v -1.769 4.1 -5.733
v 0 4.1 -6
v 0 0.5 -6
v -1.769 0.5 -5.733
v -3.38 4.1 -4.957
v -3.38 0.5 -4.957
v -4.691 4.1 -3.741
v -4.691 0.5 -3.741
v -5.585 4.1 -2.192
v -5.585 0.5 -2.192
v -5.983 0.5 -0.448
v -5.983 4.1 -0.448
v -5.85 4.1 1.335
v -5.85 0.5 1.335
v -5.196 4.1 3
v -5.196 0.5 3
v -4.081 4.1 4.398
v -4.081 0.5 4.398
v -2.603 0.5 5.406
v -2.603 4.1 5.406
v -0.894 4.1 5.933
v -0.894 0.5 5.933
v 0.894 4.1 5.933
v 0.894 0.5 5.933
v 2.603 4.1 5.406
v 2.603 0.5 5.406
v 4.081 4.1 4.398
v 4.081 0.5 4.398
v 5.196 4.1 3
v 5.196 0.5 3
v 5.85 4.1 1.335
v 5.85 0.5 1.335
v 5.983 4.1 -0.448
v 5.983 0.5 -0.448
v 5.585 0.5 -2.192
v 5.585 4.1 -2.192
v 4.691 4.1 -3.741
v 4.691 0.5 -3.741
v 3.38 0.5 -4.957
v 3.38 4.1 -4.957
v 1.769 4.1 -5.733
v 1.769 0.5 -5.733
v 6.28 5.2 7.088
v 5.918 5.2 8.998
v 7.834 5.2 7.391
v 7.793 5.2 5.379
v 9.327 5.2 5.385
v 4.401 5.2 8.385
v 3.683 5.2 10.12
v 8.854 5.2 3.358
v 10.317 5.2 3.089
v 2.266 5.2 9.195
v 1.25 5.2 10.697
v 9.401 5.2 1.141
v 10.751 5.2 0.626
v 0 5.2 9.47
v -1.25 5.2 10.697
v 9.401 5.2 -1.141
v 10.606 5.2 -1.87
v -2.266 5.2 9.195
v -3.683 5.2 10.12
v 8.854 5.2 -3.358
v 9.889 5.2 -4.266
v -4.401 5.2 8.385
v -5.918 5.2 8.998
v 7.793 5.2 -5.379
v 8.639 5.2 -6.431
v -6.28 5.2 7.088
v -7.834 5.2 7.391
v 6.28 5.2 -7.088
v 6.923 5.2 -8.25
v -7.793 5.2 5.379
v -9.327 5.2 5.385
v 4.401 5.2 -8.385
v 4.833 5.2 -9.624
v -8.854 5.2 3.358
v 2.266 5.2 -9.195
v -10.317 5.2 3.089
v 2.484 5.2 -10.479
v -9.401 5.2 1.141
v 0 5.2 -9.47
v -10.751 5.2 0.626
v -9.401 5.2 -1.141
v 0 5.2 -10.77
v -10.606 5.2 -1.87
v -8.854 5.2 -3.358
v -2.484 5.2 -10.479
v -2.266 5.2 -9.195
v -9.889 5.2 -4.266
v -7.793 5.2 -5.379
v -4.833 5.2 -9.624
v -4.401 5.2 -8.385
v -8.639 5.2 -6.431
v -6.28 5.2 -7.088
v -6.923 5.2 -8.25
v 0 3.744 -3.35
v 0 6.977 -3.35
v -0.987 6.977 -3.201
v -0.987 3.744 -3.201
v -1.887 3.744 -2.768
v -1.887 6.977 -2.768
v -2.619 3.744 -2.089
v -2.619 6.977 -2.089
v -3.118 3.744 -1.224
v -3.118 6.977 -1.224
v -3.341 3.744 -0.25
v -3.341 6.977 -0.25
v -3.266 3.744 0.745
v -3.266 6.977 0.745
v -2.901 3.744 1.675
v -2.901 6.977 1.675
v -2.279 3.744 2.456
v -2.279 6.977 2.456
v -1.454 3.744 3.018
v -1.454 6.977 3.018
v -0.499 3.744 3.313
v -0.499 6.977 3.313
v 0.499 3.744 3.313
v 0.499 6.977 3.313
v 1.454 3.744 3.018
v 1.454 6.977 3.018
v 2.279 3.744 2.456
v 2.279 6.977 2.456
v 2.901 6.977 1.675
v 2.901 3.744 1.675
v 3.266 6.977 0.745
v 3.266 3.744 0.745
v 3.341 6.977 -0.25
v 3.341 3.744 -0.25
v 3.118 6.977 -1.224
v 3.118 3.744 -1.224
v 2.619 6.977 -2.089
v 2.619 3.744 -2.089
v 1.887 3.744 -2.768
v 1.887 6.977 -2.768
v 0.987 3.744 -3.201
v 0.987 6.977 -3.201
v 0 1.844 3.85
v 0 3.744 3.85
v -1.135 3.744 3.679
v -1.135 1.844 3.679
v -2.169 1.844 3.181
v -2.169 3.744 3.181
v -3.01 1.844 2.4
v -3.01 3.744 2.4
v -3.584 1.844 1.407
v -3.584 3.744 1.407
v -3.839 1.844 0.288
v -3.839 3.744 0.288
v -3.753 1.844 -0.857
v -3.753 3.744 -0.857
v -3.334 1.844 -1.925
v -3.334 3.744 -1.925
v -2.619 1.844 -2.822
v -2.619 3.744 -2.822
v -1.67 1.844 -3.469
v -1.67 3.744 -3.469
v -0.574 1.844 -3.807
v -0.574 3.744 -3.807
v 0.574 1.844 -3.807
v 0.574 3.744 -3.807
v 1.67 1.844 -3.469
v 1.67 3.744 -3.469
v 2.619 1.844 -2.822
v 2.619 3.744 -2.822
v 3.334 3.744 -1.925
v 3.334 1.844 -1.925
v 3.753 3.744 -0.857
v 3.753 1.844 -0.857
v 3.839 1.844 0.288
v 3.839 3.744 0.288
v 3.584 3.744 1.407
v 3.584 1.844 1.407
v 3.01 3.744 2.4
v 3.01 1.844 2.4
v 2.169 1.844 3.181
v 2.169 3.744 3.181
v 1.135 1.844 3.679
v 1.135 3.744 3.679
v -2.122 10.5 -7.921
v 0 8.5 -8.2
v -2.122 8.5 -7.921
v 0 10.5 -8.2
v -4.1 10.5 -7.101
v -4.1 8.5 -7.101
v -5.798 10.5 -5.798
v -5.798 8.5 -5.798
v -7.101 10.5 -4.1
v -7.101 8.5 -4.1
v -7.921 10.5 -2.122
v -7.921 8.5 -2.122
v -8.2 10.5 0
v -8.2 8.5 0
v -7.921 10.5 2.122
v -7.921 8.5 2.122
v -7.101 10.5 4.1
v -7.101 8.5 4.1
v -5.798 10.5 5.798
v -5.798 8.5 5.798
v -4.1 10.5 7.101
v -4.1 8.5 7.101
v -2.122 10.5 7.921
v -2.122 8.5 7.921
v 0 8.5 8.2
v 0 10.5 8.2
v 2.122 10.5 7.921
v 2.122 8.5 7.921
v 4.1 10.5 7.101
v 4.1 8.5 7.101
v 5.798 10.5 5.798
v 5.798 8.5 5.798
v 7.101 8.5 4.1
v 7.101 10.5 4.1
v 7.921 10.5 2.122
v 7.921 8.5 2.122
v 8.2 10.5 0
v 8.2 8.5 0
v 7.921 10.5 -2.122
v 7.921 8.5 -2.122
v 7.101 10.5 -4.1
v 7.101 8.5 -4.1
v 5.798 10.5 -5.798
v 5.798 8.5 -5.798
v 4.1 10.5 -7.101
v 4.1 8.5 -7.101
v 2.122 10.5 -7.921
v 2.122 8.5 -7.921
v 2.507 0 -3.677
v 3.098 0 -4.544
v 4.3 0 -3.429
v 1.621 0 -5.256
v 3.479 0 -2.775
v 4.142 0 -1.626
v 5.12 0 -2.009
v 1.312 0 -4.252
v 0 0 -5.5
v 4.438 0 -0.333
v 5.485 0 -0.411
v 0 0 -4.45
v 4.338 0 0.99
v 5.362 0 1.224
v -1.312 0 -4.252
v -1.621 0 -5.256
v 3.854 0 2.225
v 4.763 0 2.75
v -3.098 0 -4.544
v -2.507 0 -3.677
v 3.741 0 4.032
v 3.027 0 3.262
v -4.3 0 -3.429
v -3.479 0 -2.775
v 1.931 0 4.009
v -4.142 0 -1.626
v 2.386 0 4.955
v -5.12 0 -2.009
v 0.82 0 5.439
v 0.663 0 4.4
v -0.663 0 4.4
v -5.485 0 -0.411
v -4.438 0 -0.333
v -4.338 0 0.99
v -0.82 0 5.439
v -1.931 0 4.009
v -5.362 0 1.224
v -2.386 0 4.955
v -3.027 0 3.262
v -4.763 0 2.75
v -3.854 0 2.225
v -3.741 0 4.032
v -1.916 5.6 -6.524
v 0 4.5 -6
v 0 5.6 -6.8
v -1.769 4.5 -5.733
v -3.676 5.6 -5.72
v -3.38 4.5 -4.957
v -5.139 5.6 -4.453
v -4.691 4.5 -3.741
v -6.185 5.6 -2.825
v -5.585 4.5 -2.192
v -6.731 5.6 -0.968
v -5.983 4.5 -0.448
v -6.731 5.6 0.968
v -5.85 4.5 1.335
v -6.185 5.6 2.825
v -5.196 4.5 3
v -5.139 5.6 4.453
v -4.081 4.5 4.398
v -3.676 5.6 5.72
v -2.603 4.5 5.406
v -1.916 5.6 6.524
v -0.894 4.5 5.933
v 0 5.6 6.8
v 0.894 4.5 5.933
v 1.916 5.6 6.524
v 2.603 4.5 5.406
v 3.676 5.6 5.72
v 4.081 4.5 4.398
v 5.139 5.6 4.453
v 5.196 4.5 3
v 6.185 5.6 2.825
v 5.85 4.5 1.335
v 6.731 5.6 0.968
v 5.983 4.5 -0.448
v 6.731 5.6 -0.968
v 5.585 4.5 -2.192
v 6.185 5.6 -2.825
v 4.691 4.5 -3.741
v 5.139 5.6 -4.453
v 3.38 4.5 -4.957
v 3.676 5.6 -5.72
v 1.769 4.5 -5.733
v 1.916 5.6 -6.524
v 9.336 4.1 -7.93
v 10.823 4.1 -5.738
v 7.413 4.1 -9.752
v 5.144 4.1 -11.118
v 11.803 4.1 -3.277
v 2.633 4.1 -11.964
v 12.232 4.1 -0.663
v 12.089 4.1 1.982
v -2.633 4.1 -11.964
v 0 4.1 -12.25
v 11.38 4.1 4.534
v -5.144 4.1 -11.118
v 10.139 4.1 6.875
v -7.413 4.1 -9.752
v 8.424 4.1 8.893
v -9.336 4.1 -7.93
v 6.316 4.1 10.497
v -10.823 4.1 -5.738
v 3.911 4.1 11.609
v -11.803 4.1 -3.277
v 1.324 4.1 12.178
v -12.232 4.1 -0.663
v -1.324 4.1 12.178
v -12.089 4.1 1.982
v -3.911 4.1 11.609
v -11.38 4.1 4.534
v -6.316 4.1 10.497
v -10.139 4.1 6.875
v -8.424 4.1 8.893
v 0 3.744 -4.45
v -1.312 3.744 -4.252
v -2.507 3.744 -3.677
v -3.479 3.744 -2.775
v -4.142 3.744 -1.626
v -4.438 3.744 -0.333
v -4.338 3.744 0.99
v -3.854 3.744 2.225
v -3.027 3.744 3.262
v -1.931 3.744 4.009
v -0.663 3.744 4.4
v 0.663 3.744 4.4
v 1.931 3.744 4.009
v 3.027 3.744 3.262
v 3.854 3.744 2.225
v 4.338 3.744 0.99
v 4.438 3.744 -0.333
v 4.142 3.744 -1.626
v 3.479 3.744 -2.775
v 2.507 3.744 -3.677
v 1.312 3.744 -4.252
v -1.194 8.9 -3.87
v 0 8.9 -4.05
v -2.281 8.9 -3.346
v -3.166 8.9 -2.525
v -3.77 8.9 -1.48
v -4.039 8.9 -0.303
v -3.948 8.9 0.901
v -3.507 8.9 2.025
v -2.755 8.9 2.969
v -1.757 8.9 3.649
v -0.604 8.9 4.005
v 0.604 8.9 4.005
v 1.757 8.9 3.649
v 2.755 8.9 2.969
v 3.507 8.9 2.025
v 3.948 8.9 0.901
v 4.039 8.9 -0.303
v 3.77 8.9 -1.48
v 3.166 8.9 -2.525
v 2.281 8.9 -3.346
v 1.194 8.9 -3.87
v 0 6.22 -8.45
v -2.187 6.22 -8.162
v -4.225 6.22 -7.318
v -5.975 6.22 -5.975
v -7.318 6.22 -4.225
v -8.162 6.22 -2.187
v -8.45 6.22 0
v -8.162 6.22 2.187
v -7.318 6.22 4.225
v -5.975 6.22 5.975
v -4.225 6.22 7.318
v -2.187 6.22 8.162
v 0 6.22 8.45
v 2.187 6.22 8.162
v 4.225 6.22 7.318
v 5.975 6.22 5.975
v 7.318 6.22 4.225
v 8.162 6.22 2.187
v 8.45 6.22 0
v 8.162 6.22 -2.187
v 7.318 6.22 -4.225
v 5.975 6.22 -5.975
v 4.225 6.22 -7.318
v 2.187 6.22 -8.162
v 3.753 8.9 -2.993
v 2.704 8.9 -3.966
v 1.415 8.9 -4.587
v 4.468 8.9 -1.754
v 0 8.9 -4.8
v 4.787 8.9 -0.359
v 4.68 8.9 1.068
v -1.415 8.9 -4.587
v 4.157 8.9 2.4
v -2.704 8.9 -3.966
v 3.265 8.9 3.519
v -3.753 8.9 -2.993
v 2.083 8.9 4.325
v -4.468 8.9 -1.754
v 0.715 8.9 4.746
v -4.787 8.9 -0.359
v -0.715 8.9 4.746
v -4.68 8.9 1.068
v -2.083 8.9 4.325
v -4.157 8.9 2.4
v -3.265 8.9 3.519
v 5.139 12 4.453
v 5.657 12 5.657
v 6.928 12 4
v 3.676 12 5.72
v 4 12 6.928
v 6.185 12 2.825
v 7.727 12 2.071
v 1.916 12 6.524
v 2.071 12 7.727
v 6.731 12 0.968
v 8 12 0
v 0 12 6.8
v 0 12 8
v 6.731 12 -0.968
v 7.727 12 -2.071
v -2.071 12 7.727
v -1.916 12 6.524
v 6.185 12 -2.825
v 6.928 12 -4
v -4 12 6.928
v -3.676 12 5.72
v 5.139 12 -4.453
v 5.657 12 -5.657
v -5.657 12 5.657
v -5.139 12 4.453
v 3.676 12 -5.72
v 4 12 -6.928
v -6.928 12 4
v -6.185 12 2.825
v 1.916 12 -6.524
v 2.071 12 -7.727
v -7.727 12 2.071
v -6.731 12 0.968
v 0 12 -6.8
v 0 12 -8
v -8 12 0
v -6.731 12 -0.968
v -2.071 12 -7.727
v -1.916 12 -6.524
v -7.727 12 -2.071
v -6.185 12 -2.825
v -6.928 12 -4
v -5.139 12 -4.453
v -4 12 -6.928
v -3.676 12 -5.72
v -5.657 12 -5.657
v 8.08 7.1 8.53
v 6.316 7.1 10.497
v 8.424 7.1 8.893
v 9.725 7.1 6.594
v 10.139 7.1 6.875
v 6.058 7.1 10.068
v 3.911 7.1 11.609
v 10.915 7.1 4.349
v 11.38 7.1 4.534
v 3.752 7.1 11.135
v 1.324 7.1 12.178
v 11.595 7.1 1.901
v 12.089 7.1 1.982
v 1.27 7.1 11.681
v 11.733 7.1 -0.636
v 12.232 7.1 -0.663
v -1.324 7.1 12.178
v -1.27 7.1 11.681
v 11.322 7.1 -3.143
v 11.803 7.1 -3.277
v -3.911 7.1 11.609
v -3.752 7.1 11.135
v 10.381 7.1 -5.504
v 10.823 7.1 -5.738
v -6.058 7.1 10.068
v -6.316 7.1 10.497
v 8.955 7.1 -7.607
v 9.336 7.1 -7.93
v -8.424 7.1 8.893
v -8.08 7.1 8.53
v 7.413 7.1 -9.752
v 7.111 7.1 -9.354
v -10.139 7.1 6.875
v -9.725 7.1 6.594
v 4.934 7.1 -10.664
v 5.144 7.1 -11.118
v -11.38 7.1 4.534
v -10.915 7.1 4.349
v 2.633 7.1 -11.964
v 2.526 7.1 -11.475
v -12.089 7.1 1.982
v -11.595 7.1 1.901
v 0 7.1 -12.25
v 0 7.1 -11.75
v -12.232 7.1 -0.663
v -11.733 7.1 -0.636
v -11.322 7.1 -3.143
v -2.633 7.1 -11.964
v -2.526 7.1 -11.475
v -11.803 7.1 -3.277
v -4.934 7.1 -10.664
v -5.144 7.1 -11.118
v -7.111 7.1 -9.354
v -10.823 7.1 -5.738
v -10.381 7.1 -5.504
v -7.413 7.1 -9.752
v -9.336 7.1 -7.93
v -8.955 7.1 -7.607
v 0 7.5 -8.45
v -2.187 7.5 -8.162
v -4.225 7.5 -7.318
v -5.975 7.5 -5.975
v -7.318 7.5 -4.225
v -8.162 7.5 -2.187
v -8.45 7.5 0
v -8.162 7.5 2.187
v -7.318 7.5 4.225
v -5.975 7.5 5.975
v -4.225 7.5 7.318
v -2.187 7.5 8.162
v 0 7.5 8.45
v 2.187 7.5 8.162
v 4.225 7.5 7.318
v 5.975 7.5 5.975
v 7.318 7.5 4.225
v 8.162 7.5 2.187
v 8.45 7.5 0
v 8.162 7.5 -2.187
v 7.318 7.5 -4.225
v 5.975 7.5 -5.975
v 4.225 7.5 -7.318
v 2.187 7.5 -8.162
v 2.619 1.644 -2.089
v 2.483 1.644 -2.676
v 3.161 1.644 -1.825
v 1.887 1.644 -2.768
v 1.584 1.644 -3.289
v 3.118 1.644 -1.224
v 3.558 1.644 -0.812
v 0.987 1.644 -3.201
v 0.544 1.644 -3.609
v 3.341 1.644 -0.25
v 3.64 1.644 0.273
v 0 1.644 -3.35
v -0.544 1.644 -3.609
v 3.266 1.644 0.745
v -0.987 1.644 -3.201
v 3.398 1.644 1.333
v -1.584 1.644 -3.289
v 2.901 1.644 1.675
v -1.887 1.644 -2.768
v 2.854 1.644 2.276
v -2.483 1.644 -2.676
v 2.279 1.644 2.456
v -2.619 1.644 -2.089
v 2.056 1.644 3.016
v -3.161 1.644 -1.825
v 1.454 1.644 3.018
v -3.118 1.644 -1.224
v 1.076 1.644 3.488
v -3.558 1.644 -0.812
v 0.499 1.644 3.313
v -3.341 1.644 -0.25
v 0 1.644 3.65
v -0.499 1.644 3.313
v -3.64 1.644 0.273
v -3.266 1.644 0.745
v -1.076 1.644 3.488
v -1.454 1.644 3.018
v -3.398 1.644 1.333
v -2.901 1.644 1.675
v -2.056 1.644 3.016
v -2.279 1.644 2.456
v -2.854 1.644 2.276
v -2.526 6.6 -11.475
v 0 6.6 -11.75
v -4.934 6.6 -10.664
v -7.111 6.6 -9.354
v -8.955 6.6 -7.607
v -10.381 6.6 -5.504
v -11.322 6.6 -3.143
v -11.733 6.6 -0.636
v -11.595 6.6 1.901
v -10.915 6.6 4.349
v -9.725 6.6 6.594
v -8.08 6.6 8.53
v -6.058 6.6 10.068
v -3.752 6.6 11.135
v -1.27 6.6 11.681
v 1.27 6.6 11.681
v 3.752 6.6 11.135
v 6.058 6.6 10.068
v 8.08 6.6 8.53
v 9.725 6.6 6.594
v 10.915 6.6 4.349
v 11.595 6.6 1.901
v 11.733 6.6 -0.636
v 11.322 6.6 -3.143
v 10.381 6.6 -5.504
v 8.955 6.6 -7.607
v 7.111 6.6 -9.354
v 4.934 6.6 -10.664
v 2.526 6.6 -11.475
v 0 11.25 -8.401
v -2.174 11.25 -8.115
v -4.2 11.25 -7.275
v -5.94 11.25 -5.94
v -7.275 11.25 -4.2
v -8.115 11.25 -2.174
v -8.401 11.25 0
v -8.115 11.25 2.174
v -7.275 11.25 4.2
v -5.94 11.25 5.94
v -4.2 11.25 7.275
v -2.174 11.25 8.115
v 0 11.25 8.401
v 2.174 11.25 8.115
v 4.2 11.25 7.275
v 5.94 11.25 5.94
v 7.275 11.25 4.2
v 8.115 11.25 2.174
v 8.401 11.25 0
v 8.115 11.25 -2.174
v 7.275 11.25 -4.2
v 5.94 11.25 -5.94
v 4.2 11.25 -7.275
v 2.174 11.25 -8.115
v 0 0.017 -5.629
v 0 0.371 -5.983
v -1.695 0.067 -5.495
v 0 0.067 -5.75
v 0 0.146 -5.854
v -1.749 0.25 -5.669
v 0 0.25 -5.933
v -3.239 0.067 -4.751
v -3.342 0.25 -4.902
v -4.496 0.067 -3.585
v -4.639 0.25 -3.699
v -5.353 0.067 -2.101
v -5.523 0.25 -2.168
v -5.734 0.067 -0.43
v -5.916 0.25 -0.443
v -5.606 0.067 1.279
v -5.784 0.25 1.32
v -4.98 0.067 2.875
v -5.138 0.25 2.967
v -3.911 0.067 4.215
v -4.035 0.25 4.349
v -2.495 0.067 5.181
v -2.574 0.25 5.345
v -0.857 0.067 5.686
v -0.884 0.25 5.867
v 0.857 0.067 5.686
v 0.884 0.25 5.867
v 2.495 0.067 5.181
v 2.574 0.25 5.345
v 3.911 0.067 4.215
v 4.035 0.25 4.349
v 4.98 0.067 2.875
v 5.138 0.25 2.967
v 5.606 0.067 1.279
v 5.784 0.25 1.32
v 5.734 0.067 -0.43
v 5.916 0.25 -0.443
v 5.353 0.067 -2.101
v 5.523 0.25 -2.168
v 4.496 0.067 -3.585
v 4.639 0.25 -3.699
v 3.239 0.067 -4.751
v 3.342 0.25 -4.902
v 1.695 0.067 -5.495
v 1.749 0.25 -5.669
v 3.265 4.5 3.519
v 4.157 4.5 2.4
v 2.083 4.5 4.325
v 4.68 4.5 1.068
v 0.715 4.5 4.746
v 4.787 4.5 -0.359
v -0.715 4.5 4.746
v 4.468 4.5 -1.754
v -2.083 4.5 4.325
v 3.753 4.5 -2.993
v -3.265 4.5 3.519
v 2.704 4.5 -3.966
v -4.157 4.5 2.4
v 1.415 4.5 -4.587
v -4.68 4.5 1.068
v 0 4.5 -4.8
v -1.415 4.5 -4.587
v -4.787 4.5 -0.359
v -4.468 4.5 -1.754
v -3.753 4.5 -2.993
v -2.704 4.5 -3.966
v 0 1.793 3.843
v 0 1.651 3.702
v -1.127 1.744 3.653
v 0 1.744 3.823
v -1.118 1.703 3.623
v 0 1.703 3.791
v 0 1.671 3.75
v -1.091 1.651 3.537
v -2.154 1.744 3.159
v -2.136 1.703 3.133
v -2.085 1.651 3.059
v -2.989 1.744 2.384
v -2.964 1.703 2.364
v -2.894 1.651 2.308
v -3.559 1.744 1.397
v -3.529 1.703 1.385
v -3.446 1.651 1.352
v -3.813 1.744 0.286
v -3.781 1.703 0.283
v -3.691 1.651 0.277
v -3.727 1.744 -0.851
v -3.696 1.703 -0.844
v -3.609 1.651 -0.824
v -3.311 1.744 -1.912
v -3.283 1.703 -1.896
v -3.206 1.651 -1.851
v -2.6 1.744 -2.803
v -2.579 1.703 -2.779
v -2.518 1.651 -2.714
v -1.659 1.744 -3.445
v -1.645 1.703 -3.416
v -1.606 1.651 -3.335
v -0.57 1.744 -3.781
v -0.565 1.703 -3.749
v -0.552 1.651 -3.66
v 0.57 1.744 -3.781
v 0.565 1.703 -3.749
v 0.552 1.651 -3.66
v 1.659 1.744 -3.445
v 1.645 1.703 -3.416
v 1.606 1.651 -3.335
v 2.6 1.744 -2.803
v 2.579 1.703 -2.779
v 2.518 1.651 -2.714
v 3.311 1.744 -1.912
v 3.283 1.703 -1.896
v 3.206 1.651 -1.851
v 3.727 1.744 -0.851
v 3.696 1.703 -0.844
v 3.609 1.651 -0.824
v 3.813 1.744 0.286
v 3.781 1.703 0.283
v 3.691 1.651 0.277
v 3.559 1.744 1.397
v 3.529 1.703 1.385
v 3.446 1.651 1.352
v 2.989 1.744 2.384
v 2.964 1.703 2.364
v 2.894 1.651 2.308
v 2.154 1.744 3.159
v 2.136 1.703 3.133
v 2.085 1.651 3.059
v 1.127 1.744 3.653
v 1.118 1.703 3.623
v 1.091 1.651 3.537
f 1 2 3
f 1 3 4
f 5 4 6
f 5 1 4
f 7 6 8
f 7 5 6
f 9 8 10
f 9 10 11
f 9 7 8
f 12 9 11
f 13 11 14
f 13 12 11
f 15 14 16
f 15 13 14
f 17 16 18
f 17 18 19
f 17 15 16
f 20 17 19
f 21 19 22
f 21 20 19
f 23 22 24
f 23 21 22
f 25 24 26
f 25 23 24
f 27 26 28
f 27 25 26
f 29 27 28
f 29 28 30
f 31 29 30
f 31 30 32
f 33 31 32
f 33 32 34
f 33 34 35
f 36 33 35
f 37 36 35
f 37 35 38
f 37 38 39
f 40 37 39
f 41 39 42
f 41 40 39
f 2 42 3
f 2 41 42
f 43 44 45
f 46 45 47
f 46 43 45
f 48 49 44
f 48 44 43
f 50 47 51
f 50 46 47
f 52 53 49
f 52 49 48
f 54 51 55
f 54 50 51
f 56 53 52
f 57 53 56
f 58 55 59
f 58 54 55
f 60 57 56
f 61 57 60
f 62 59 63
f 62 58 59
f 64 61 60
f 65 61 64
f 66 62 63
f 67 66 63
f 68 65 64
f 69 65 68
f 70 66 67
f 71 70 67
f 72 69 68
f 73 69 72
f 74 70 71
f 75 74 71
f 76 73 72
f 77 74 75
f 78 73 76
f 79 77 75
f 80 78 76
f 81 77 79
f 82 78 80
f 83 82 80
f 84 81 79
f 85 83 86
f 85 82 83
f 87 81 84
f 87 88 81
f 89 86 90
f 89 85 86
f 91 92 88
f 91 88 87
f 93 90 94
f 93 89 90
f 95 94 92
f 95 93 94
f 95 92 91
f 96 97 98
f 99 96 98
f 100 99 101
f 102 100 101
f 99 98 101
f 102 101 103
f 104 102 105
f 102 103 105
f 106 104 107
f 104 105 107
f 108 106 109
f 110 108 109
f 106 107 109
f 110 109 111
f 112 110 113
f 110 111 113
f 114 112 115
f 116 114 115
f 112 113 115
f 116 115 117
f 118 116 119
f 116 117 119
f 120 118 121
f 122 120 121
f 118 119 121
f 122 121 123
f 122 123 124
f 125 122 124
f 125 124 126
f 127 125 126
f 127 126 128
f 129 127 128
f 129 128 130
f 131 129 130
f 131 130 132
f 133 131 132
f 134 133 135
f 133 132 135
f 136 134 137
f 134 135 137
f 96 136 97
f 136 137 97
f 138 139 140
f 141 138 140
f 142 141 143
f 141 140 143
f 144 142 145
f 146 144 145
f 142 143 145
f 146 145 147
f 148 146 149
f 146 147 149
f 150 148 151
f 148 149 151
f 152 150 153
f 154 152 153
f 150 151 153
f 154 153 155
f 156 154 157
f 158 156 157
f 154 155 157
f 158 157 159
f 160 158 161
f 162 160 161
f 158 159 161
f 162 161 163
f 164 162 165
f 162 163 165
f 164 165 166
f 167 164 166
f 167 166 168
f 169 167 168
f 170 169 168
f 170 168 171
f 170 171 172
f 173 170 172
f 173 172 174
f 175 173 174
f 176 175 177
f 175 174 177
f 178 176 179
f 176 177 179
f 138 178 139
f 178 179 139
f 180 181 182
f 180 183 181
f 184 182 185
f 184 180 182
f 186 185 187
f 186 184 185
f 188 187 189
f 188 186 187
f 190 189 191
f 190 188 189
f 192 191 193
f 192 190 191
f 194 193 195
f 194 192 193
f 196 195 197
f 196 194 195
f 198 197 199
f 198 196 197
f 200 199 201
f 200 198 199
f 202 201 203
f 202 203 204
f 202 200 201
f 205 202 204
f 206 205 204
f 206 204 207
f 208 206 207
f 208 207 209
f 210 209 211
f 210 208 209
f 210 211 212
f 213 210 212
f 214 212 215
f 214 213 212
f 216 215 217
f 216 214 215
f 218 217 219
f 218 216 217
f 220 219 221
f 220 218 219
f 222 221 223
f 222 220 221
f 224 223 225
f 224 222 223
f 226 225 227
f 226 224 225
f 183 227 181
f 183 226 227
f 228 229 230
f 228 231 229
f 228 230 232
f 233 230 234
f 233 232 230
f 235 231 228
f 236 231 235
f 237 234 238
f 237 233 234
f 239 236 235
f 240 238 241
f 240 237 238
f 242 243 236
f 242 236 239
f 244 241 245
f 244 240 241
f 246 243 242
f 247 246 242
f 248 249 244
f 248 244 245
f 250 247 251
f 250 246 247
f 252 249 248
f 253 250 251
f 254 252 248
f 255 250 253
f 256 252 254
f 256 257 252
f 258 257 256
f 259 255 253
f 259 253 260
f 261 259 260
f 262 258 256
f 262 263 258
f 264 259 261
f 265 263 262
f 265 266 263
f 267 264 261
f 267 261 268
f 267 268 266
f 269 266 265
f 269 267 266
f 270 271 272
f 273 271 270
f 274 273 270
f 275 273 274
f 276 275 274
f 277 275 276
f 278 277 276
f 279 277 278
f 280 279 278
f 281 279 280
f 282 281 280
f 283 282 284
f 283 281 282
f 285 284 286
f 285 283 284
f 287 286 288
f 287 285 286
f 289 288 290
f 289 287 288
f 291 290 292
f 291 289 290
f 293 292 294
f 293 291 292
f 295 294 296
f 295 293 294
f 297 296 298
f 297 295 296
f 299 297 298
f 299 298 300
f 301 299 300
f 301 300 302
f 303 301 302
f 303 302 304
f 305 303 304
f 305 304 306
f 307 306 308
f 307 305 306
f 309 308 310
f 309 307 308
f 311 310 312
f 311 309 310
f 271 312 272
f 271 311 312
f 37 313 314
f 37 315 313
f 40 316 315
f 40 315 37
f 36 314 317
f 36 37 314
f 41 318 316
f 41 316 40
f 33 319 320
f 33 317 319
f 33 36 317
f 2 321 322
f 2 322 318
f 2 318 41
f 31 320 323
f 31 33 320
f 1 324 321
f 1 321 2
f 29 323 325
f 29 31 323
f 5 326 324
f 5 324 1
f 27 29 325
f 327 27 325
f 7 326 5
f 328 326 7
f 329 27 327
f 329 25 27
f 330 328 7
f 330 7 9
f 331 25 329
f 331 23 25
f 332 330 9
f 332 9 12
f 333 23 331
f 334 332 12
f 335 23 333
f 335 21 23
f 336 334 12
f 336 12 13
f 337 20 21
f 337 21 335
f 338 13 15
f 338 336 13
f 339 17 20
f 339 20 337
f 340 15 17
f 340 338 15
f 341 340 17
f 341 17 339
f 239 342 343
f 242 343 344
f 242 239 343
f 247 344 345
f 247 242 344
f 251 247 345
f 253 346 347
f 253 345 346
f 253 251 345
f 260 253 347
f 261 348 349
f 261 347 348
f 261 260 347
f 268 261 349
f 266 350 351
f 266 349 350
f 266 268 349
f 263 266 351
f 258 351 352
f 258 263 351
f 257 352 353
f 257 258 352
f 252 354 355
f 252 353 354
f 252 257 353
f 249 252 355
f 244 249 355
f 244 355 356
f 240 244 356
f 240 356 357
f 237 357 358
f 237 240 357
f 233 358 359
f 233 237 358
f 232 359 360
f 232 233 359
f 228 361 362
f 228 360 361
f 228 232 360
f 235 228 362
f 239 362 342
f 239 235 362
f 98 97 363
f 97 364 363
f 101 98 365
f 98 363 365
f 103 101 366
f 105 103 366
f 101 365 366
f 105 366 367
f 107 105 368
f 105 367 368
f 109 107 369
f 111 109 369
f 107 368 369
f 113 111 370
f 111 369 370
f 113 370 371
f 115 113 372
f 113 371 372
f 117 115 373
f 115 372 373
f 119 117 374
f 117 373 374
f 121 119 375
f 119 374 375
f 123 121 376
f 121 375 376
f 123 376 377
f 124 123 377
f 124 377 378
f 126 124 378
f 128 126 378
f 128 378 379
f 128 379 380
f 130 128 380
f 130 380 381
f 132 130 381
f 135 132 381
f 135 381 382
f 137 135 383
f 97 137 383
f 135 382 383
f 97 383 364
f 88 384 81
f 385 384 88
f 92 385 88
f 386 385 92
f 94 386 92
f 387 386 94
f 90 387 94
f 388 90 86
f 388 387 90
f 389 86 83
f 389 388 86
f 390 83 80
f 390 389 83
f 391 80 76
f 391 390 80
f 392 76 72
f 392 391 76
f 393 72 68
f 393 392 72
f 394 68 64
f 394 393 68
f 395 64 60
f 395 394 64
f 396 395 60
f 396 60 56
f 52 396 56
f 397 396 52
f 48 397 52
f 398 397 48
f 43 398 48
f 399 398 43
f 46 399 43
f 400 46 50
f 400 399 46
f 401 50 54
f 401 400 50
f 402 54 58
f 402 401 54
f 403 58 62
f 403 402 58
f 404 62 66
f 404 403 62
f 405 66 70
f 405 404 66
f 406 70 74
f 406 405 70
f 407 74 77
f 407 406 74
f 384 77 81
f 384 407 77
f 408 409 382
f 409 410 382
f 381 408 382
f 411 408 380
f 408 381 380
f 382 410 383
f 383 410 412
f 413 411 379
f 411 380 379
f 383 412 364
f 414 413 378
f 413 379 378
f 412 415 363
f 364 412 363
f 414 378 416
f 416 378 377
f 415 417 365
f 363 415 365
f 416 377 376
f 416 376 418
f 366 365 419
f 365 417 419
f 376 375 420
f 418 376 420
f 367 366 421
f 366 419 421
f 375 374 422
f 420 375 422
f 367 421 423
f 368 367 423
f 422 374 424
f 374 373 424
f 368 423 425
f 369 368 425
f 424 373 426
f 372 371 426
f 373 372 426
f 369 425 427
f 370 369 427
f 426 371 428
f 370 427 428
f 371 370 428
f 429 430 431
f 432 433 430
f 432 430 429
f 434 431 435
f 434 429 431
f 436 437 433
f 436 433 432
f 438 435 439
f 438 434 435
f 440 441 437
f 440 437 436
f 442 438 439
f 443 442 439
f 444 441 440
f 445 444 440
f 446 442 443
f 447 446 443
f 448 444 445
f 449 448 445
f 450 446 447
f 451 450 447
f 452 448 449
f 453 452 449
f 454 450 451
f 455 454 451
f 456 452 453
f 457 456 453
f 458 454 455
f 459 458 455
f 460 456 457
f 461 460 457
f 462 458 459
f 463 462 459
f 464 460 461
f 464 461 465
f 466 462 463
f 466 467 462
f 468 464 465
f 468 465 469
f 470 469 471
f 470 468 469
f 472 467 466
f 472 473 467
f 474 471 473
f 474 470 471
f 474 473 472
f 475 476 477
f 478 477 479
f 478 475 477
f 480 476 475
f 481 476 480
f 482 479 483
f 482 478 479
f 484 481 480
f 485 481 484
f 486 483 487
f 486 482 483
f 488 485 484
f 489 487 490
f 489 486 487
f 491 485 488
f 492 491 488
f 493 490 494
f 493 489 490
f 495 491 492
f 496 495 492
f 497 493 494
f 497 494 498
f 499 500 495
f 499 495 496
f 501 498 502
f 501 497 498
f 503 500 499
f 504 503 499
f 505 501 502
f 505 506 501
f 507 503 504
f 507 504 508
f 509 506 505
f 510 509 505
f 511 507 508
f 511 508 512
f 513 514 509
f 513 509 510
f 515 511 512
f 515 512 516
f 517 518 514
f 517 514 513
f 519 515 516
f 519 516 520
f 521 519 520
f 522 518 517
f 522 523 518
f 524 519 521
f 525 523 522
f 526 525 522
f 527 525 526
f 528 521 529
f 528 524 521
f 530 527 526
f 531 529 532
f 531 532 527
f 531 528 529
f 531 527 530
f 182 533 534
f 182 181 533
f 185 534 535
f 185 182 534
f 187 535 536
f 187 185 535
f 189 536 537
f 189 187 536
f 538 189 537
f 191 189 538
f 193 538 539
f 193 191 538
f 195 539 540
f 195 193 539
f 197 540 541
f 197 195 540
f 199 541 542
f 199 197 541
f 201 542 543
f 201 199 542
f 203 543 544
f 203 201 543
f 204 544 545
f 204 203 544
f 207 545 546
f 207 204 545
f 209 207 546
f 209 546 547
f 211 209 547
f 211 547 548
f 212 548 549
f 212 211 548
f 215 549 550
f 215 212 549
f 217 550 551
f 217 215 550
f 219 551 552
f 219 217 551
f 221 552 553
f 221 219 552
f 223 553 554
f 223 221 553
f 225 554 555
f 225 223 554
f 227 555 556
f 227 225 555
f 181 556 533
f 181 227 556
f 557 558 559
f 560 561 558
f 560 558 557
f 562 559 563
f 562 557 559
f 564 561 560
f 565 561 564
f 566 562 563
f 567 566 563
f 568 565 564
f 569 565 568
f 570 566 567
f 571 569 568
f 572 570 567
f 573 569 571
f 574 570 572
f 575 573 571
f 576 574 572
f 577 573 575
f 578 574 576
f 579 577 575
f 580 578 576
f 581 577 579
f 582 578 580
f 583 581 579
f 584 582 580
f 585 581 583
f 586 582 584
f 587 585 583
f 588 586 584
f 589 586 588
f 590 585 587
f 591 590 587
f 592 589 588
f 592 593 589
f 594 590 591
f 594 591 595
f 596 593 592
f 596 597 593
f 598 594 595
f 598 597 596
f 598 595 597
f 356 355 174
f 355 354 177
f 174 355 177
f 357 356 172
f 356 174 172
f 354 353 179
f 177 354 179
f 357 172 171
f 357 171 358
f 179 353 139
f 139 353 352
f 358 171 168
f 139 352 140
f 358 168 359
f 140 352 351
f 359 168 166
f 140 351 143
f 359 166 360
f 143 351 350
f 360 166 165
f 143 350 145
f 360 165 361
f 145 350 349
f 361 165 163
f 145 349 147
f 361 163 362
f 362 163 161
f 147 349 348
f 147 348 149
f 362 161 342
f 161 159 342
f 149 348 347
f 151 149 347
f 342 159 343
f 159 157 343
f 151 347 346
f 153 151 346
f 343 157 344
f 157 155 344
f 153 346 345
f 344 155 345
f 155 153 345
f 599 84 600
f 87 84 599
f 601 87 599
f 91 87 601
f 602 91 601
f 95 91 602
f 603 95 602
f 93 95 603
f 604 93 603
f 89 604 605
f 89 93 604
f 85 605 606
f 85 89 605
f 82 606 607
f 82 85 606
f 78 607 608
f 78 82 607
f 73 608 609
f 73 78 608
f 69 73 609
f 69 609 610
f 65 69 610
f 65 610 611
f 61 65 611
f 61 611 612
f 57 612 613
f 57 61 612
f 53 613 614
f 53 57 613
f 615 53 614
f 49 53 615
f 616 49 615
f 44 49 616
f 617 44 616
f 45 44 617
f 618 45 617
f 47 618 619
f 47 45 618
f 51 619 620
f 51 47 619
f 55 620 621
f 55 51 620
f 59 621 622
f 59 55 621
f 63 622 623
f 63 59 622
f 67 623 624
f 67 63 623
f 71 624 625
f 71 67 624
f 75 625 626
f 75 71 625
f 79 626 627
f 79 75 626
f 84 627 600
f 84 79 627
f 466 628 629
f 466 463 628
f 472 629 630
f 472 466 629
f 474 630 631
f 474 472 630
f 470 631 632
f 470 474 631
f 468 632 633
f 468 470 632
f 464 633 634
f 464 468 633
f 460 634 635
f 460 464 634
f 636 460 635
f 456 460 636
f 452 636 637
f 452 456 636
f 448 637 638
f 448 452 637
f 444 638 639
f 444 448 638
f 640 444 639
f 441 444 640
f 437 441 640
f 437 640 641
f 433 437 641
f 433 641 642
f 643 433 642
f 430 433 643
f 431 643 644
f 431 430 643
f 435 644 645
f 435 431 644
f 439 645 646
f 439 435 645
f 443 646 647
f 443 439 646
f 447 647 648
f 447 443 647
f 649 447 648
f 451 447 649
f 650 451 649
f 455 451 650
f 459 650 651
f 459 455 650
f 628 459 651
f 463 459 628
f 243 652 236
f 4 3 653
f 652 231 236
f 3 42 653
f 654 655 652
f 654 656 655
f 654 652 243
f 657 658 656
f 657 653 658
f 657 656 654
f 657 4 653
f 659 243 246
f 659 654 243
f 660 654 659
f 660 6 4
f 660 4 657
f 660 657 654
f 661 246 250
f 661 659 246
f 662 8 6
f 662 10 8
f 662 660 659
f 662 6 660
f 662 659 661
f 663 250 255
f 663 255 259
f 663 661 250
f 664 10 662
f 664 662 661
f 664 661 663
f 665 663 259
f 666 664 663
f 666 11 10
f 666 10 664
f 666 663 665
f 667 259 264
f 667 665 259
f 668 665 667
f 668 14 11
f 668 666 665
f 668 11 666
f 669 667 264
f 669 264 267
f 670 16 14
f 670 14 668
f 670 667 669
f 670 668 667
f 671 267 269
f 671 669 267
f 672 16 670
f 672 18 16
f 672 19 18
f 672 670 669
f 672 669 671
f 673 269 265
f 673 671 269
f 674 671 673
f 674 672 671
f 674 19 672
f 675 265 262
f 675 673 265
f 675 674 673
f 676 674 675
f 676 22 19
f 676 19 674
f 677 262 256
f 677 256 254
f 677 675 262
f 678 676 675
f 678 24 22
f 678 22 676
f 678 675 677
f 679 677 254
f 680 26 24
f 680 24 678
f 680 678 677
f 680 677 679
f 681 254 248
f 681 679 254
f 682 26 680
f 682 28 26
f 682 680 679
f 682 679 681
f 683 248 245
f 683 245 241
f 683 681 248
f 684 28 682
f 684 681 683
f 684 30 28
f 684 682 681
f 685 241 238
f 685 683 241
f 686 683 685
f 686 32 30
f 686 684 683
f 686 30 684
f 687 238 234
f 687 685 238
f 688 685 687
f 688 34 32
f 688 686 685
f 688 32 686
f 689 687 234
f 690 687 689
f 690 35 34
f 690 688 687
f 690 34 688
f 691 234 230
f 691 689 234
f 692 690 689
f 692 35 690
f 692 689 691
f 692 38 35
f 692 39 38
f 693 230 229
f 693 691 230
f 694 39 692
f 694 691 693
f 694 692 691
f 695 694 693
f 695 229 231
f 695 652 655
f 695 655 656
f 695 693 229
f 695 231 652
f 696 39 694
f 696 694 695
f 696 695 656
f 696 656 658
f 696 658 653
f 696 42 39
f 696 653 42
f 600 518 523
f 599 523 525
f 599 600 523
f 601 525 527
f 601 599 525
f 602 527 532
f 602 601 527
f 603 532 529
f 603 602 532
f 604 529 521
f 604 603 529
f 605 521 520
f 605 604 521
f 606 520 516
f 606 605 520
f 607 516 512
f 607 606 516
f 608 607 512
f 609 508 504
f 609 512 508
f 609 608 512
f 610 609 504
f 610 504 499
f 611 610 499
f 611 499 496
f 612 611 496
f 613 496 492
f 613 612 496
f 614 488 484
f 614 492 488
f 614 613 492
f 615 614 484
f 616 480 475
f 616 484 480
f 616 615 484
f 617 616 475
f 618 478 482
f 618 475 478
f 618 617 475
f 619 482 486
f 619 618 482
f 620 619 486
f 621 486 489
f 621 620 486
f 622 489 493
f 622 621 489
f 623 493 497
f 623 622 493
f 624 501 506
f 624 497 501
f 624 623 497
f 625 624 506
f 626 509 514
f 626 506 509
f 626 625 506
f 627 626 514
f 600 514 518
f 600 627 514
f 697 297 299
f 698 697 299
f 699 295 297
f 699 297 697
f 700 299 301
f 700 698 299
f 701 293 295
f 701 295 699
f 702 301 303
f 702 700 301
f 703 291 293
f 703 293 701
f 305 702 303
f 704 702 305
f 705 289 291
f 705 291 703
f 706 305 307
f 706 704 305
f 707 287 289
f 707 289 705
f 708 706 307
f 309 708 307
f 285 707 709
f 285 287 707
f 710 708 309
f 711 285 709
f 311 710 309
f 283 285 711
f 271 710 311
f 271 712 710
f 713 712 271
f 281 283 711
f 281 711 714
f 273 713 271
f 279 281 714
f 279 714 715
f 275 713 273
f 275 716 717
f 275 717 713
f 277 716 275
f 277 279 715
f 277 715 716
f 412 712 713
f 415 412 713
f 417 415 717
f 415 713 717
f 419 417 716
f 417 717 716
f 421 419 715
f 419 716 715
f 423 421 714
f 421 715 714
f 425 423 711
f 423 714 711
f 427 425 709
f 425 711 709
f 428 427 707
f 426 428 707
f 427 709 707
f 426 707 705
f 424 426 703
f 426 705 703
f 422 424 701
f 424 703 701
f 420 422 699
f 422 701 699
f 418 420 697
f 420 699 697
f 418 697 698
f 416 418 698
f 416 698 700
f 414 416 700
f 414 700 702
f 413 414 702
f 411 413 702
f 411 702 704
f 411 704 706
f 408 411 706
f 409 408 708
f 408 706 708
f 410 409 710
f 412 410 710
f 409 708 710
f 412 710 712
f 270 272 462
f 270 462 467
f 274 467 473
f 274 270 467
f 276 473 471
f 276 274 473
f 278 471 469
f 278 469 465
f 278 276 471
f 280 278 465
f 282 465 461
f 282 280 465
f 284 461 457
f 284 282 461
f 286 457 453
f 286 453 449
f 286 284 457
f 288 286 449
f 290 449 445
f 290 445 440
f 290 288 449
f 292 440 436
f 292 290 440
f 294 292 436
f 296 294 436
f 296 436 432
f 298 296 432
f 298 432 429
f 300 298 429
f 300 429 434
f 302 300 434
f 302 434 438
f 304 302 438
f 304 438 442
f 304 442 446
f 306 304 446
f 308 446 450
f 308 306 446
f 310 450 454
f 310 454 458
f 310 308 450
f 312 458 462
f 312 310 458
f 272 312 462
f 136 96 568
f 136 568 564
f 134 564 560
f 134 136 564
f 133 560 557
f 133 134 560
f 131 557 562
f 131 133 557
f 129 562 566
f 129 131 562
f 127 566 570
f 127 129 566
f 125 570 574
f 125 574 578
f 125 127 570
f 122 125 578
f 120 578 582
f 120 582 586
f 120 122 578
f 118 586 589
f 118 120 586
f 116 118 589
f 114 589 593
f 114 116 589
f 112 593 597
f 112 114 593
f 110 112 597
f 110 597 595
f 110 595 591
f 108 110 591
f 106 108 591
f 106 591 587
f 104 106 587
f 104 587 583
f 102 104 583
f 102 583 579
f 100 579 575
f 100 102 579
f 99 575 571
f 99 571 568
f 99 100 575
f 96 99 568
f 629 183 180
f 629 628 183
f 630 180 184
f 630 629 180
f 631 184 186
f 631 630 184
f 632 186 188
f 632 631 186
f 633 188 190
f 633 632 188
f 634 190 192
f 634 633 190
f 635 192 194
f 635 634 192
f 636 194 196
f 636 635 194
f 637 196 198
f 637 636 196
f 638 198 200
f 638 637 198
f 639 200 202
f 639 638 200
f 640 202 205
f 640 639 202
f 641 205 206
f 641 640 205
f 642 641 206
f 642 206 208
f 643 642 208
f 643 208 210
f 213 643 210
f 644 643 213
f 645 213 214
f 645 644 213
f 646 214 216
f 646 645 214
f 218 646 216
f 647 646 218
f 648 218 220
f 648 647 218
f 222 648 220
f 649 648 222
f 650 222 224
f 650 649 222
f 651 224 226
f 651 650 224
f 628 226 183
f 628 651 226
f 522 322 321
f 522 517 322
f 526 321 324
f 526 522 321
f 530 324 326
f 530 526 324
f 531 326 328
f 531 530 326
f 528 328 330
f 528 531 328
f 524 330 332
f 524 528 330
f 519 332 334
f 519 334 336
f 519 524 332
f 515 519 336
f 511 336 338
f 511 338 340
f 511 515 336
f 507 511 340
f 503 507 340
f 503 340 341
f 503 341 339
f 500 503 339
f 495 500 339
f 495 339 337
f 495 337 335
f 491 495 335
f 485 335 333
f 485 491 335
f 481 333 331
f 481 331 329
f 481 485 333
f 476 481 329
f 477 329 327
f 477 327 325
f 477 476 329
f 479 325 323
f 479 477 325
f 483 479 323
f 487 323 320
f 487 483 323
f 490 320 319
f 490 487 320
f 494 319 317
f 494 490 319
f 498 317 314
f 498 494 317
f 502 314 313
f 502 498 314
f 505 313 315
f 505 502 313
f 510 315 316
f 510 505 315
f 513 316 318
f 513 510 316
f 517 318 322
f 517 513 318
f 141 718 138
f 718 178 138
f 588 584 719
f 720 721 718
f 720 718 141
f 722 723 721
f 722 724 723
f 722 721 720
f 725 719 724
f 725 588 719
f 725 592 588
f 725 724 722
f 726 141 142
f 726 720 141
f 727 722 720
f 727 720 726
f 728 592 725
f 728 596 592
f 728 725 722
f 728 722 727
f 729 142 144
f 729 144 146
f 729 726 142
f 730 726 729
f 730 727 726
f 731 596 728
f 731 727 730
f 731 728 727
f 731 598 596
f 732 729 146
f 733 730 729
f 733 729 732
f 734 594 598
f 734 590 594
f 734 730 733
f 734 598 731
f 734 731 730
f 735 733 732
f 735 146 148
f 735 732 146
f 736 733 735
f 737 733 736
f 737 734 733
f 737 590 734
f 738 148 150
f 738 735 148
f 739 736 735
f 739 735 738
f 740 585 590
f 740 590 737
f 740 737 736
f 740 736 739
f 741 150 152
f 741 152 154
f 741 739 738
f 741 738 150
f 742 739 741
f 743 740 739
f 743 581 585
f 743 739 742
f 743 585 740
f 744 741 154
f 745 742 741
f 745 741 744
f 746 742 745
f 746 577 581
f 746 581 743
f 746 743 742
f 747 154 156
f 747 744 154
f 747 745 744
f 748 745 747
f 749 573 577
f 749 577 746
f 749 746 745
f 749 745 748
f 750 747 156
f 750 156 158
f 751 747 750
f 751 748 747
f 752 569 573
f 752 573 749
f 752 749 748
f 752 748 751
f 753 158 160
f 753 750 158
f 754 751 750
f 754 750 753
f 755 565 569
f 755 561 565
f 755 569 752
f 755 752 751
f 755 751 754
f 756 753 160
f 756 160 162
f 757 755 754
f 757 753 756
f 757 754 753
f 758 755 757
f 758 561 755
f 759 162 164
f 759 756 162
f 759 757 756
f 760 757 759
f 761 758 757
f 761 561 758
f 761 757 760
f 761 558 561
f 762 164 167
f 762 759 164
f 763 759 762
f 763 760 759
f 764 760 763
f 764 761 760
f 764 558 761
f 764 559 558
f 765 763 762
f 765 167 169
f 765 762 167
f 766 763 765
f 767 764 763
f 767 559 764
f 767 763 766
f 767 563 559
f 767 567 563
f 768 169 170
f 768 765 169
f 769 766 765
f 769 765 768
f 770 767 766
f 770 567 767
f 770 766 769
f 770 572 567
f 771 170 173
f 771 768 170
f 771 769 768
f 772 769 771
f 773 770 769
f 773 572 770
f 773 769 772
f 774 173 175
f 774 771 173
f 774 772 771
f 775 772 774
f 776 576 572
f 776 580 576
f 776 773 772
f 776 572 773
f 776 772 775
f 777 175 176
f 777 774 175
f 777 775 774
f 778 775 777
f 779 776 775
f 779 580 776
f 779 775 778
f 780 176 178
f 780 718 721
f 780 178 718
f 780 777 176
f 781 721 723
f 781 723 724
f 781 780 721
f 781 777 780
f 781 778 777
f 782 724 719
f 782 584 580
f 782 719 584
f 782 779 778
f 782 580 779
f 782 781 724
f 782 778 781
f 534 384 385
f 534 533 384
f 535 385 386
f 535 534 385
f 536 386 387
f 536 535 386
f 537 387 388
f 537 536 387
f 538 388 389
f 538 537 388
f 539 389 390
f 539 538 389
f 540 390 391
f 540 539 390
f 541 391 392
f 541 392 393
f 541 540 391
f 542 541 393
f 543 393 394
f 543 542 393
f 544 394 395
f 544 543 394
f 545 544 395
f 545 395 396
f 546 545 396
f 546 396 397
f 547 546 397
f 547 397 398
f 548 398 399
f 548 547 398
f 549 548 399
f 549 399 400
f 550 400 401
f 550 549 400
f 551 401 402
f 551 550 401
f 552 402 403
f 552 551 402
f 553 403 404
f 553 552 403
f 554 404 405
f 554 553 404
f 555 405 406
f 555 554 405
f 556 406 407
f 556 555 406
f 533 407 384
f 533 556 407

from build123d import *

# Parameters (mm, degrees)
SKETCH8_R           = 3.85
SKETCH8_R_2         = 3.35
BOSS_EXTRUDE1_DEPTH = 2.1
FILLET2_R           = 0.5
FILLET3_R           = 0.2


with BuildPart() as part:
    # Sketch1 → Revolve1 (revolve)
    with BuildSketch(Plane.XY, mode=Mode.PRIVATE) as revolve1_sk:
        Polygon((-12.25, 7.1), (-4.45, 7.1), (-4.45, 0), (-6, 0), (-6, 4.1), (-12.25, 4.1), align=None)
    revolve(revolve1_sk.sketch.rotate(Axis((0, 0, 0), (0, 1, 0)), 270), axis=Axis((0, 0, 0), (0, 1, 0)))

    # Sketch6 → Cut-Revolve2 (revolve, cut)
    with BuildSketch(Plane.XY, mode=Mode.PRIVATE) as cut_revolve2_sk:
        Polygon((-11.75, 7.1), (-11.75, 6.6), (-10.769709447, 5.2), (-6.8, 5.2), (-6.8, 4.5), (0, 4.5), (0, 7.1), (0, 9.850026385), (-11.75, 9.850026385), align=None)
    revolve(cut_revolve2_sk.sketch.rotate(Axis((0, 4.5, 0), (0, 1, 0)), 270), axis=Axis((0, 4.5, 0), (0, 1, 0)), mode=Mode.SUBTRACT)

    # Sketch7 → Revolve2 (revolve)
    with BuildSketch(Plane.XY, mode=Mode.PRIVATE) as revolve2_sk:
        Polygon((-4.8, 8.9), (-4.8, 3.744419371), (-3.35, 3.744419371), (-3.35, 6.976765806), (-4.05, 8.9), align=None)
    revolve(revolve2_sk.sketch.rotate(Axis((0, 0, 0), (0, 1, 0)), 270), axis=Axis((0, 0, 0), (0, 1, 0)))

    # Sketch8 → Boss-Extrude1 (add)
    with BuildSketch(Plane.XZ.offset(-3.744419371)):
        with Locations(Location((0, 0, 0), (0, 0, 90))):
            Circle(SKETCH8_R)
        with Locations(Location((0, 0, 0), (0, 0, 270))):
            Circle(SKETCH8_R_2, mode=Mode.SUBTRACT)
    extrude(amount=BOSS_EXTRUDE1_DEPTH)

    # Sketch9 → Revolve3 (revolve)
    with BuildSketch(Plane.XY, mode=Mode.PRIVATE) as revolve3_sk:
        Polygon((-6.799806645, 12), (-6.799806645, 5.2), (-9.469806645, 5.2), (-8.45, 6.219806645), (-8.45, 7.5), (-8.2, 8.5), (-8.2, 10.5), (-8.400961894, 11.25), (-7.999806645, 12), align=None)
    revolve(revolve3_sk.sketch.rotate(Axis((0, 0, 0), (0, 1, 0)), 270), axis=Axis((0, 0, 0), (0, 1, 0)))

    # Sketch11 → Revolve4 (revolve)
    with BuildSketch(Plane.XY, mode=Mode.PRIVATE) as revolve4_sk:
        Polygon((-6.799806645, 5.6), (-6, 4.5), (-6, 4.308890283), (-7.13977868, 4.308890283), (-7.13977868, 5.6), align=None)
    revolve(revolve4_sk.sketch.rotate(Axis((0, 0, 0), (0, 1, 0)), 270), axis=Axis((0, 0, 0), (0, 1, 0)))

    # Fillet2
    fillet2_edges = [part.edges().sort_by_distance(p)[0] for p in [
        (0, 0, 6),
    ]]
    fillet(fillet2_edges, radius=FILLET2_R)

    # Fillet3
    fillet3_edges = [part.edges().sort_by_distance(p)[0] for p in [
        (0, 1.644419371, -3.85),
    ]]
    fillet(fillet3_edges, radius=FILLET3_R)


solid = part.part
